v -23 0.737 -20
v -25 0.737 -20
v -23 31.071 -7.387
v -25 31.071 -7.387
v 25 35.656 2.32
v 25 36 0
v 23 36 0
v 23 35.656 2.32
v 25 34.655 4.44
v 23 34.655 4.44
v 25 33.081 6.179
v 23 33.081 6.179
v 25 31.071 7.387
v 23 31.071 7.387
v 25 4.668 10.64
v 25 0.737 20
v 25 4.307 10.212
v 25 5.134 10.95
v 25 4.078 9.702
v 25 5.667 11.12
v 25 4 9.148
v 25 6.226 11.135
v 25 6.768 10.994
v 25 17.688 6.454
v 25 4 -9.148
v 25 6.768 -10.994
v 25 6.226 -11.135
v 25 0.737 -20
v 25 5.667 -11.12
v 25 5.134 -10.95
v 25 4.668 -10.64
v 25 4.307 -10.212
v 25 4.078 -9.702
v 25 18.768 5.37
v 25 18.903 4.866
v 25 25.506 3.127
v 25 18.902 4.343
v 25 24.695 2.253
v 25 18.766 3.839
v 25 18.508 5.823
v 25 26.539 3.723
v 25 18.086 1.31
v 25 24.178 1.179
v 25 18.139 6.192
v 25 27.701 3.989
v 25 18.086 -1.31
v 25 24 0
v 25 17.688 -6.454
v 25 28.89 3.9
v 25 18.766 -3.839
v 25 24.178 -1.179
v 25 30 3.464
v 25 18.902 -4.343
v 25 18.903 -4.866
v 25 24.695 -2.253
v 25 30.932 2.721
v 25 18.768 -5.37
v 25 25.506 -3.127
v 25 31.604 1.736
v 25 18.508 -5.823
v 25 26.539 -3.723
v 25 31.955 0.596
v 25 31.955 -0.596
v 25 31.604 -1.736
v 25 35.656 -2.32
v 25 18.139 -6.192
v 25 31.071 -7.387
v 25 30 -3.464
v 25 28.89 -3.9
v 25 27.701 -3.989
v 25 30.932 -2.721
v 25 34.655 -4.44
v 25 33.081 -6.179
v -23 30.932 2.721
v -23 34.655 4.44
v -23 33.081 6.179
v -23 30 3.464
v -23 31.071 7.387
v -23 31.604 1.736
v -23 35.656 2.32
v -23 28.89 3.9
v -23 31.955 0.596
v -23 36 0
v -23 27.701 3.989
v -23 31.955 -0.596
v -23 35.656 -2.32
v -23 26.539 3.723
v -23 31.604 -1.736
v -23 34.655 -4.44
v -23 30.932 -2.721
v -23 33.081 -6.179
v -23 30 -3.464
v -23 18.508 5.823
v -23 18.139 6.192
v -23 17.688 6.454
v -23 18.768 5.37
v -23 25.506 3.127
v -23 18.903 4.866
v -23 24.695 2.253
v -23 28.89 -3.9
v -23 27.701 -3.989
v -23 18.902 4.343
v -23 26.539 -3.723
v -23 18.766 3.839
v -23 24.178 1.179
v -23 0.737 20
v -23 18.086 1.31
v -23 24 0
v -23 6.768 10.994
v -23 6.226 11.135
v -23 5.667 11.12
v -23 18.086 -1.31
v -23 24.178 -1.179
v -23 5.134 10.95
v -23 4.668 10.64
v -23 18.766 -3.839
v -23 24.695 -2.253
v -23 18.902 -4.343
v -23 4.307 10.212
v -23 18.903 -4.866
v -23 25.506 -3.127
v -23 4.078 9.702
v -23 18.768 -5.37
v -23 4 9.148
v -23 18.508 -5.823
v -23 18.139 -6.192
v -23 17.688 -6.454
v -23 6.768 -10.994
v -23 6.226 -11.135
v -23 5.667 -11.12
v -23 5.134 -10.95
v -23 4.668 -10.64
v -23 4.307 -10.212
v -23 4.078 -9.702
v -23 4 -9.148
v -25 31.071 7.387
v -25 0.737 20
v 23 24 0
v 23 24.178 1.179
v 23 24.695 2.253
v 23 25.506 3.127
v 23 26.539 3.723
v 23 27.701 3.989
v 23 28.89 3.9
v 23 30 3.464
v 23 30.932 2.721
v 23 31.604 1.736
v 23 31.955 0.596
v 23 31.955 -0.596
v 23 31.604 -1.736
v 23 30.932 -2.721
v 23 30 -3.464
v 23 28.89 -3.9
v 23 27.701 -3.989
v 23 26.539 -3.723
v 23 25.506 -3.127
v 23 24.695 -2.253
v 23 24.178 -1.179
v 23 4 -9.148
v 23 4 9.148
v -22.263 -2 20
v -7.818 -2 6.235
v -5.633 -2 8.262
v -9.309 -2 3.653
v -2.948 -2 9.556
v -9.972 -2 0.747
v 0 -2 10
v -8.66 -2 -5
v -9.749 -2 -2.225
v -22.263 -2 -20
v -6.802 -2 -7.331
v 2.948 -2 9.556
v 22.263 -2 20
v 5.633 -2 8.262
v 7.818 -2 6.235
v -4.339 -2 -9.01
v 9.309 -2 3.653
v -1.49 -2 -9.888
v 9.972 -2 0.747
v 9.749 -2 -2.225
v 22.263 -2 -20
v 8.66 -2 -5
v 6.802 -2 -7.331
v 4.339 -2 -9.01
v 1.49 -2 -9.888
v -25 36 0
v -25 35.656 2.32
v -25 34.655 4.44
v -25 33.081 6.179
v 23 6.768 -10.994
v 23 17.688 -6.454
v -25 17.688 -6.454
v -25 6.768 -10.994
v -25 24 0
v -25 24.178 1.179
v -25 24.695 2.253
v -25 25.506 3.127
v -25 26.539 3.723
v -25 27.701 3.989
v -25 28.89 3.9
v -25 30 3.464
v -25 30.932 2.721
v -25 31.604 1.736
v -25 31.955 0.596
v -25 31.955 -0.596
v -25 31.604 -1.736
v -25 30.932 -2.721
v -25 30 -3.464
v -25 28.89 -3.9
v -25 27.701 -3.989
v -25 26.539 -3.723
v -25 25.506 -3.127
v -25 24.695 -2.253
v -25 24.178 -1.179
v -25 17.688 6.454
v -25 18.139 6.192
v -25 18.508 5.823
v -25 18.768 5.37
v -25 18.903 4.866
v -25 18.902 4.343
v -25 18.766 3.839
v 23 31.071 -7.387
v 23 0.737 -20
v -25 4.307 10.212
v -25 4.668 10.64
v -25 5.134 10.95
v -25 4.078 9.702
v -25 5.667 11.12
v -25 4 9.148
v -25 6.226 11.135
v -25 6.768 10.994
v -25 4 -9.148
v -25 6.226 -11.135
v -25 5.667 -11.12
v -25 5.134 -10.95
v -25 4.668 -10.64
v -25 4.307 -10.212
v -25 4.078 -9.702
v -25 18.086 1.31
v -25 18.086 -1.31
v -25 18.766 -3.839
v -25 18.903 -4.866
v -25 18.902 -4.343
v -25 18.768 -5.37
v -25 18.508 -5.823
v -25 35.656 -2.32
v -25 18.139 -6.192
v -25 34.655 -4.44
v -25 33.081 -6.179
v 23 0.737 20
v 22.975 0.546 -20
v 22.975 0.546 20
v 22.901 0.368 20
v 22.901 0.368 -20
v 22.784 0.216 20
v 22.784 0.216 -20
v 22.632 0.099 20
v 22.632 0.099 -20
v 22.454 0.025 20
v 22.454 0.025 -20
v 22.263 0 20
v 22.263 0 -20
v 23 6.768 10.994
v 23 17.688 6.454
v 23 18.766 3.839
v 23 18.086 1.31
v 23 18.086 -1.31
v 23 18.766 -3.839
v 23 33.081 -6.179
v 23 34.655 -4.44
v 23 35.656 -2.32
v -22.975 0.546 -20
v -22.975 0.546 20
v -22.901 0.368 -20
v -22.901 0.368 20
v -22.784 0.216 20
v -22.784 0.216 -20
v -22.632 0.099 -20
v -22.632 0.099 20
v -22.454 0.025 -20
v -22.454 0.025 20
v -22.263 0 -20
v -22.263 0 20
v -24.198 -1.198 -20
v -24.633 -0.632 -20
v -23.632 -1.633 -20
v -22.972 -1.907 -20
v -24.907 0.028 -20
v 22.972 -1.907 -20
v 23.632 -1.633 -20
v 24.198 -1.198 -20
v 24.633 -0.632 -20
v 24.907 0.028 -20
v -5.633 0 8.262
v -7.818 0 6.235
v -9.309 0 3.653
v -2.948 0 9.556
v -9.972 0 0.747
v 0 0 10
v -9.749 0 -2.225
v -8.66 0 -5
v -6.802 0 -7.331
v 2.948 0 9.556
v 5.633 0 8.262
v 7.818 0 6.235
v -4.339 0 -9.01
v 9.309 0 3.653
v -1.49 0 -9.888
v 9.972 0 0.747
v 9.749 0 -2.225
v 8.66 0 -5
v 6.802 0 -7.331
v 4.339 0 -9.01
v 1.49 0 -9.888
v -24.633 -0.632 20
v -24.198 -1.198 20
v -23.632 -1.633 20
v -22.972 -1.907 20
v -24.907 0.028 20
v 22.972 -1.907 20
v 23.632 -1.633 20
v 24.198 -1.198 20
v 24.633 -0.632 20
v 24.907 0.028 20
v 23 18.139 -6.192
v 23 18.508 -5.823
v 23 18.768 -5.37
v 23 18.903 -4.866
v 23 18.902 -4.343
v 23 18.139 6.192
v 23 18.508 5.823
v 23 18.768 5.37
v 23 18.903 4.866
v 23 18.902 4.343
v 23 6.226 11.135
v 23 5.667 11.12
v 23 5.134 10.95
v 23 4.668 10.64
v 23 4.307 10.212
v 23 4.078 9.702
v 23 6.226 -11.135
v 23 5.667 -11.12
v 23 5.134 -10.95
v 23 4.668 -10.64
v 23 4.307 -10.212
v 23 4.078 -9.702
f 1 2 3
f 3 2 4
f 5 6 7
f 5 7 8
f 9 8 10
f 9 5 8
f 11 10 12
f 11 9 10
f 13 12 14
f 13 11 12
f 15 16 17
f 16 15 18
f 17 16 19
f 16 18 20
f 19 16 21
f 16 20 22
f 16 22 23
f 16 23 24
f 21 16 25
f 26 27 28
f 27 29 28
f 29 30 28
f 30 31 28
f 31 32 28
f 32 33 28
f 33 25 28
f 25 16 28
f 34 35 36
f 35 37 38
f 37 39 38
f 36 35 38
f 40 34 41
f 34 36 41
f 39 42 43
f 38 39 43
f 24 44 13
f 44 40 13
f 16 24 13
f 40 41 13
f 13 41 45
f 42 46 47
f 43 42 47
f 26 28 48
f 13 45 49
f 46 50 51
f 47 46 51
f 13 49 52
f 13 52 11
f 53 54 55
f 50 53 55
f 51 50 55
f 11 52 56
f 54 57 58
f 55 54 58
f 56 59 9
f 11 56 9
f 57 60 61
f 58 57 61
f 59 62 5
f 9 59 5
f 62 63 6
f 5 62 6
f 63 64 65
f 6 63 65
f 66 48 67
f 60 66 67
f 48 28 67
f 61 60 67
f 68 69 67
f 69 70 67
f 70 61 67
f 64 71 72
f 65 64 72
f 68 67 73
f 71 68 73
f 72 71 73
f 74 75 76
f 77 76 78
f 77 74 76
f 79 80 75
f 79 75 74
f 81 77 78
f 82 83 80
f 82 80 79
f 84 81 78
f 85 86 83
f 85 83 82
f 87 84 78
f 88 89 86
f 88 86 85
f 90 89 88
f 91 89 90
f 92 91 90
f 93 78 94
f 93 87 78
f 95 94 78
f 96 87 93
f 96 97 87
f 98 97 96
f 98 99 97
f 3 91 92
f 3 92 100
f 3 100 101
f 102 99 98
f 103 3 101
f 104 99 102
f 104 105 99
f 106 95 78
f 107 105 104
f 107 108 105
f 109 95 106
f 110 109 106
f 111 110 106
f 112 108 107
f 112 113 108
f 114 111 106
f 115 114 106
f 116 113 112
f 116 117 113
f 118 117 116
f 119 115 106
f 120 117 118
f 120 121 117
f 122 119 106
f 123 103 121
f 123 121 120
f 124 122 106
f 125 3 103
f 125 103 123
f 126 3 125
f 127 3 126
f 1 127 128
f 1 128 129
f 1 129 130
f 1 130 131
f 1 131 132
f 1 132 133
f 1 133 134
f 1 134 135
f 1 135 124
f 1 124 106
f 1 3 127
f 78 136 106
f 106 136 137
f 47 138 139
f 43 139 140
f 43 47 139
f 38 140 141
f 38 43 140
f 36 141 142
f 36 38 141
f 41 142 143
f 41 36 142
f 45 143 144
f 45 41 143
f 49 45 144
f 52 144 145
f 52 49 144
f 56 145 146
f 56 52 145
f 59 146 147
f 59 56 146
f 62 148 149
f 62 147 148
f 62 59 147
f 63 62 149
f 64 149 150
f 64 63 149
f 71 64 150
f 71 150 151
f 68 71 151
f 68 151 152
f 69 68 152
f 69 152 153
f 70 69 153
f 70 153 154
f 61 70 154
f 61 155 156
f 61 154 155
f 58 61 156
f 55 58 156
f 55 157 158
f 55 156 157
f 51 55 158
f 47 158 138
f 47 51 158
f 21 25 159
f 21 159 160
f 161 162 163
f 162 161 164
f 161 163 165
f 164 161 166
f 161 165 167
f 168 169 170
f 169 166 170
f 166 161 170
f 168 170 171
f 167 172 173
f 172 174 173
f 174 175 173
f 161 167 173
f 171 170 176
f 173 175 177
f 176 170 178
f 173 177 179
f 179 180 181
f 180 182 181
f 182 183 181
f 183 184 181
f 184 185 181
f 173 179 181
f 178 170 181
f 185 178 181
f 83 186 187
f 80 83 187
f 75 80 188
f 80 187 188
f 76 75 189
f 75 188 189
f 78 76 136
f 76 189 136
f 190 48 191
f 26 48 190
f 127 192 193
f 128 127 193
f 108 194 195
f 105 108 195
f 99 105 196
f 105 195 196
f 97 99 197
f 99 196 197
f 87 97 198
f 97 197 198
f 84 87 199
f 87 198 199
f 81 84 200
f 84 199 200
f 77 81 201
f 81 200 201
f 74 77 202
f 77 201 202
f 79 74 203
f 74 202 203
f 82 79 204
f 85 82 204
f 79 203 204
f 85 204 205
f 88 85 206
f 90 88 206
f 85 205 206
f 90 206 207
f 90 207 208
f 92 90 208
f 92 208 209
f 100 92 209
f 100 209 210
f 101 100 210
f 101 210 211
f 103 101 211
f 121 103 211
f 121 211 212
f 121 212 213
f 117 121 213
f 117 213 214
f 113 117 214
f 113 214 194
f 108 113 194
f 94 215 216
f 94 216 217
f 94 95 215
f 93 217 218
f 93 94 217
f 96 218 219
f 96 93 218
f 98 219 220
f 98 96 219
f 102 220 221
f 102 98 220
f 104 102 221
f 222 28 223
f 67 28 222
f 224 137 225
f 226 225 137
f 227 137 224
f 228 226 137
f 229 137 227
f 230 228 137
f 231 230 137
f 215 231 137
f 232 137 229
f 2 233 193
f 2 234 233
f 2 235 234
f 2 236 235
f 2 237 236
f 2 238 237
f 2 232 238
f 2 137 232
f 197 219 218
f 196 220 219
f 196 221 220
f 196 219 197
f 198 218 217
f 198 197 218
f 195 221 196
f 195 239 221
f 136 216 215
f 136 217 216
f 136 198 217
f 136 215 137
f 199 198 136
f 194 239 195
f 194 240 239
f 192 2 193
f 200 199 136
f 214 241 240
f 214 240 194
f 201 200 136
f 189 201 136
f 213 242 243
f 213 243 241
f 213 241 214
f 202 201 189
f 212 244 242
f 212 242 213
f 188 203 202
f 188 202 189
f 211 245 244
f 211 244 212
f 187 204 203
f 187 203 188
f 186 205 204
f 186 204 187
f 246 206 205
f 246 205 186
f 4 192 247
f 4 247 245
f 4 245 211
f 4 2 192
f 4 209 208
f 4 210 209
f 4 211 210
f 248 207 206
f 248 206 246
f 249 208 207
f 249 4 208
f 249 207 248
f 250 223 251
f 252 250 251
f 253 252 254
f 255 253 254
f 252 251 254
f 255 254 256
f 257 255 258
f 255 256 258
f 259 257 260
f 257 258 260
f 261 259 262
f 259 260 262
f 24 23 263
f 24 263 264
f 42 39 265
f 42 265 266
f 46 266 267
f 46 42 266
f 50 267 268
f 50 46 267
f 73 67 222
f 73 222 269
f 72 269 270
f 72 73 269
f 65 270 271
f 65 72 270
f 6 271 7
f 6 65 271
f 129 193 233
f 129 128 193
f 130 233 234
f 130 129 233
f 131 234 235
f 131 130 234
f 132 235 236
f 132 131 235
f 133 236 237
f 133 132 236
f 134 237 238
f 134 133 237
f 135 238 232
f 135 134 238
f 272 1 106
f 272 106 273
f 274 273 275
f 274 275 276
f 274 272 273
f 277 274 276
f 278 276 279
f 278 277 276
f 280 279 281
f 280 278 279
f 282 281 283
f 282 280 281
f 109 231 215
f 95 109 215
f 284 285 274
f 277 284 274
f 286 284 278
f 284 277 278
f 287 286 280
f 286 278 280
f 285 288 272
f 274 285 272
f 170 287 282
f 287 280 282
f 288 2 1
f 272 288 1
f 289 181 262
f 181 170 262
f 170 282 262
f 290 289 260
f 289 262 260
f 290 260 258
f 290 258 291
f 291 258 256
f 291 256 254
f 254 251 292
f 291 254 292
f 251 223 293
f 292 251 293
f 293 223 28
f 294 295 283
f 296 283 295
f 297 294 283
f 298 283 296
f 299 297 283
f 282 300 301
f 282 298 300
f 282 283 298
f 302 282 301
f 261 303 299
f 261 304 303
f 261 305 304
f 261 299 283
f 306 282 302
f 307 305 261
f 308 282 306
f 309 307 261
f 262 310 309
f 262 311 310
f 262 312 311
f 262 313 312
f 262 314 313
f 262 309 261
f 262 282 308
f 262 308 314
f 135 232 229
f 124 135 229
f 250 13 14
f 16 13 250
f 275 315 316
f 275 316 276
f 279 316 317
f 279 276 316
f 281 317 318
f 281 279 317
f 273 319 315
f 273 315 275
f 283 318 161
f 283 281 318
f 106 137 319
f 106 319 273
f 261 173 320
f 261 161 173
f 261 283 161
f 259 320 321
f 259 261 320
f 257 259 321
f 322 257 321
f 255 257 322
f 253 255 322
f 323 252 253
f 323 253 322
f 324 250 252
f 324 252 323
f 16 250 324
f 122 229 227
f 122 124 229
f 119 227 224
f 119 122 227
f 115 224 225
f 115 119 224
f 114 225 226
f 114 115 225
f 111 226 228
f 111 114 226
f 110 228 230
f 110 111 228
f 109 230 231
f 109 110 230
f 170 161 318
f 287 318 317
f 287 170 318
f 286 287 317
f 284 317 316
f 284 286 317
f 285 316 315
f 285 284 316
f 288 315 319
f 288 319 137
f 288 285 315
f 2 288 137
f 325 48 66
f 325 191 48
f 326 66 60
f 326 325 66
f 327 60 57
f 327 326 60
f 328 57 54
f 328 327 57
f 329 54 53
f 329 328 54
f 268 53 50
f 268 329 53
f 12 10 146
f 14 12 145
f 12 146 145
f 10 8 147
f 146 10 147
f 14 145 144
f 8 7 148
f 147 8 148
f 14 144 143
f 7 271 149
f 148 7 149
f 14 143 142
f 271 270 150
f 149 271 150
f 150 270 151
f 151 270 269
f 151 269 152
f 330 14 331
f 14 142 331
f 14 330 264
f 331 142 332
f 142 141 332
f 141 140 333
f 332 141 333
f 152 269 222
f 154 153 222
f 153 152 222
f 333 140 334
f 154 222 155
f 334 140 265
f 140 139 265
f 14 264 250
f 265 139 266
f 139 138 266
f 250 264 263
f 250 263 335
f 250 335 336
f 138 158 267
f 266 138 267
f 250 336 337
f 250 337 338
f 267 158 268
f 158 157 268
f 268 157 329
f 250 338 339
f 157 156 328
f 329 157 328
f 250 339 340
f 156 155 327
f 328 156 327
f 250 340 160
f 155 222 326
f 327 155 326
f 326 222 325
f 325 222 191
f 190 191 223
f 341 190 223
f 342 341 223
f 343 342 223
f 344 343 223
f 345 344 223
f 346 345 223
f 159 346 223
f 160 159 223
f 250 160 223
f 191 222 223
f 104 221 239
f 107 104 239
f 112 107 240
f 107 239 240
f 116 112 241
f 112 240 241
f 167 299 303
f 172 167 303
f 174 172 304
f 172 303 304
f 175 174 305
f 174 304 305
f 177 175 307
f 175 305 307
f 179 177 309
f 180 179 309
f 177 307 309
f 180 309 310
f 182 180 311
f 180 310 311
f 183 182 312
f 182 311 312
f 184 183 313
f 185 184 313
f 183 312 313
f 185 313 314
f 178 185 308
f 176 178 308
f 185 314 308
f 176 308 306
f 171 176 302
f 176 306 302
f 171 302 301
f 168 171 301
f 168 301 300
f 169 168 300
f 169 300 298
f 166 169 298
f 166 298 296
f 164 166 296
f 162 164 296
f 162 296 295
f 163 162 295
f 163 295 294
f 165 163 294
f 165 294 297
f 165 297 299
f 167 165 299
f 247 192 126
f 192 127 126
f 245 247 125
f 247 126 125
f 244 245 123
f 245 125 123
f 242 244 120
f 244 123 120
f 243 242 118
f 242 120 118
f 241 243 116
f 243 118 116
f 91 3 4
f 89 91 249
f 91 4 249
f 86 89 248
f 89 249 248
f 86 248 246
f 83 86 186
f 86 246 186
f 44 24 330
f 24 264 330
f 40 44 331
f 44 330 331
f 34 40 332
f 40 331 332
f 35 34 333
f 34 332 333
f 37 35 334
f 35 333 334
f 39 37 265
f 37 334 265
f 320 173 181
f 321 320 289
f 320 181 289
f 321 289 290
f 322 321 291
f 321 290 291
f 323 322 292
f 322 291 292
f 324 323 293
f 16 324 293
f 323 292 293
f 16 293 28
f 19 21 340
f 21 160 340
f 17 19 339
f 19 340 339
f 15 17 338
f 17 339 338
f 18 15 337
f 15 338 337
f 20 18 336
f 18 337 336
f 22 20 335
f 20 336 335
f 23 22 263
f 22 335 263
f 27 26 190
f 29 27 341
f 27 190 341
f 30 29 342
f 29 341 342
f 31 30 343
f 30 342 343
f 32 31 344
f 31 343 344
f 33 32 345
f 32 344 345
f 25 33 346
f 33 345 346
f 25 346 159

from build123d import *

# Parameters (mm, degrees)
SKETCH1_W                    = 50
SKETCH1_H                    = 40
BASE_FLANGE1_DEPTH           = 2
EDGE_FLANGE1_STRIP_W         = 9.4732
EDGE_FLANGE1_STRIP_H         = 2
EDGE_FLANGE1_STRIP_CUT_DEPTH = 40
EDGE_FLANGE1_DEPTH           = 40
SKETCH14_R                   = 4
CUT_EXTRUDE2_DEPTH           = 10
FILLET1_R                    = 2
FILLET1_OF_MIRROR2_R         = 2
SKETCH23_R                   = 10
CUT_EXTRUDE3_DEPTH           = 10


# Sheet-metal steps are written as plain solids
with BuildPart() as part:
    # Sketch1 → Base-Flange1 (new body)
    with BuildSketch(Plane(origin=(0, 0, 0), x_dir=(1, 0, 0), z_dir=(0, 1, 0))):
        Rectangle(SKETCH1_W, SKETCH1_H)
    extrude(amount=-BASE_FLANGE1_DEPTH)

    # Edge-Flange1 strip (across the edge) → Edge-Flange1 strip cut (cut)
    with BuildSketch(Plane(origin=(-25, 0, -20), x_dir=(1, 0, 0), z_dir=(0, 0, 1))):
        with Locations((-2, -1)):
            Rectangle(EDGE_FLANGE1_STRIP_W, EDGE_FLANGE1_STRIP_H)
    edge_flange1_strip_cut = extrude(amount=EDGE_FLANGE1_STRIP_CUT_DEPTH, mode=Mode.SUBTRACT)

    # Edge-Flange1 section (across the edge) → Edge-Flange1 (add)
    with BuildSketch(Plane(origin=(-25, 0, -20), x_dir=(1, 0, 0), z_dir=(0, 0, 1))):
        with BuildLine():
            Line((0, 0.7366), (0, 36))
            Line((0, 36), (2, 36))
            Line((2, 36), (2, 0.7366))
            ThreePointArc((2, 0.7366), (2.215745145, 0.215745145), (2.7366, 0))
            Line((2.7366, 0), (2.7366, -2))
            ThreePointArc((2.7366, -2), (0.801531583, -1.198468417), (0, 0.7366))
        make_face()
    edge_flange1 = extrude(amount=EDGE_FLANGE1_DEPTH)

    # Sketch14 → Cut-Extrude2 (cut)
    with BuildSketch(Plane.ZY.offset(25)):
        with BuildLine():
            Line((-20, 0.7366), (-7.38689697, 31.071441544))
            ThreePointArc((-7.38689697, 31.071441544), (-4.440071376, 34.654755155), (0, 36))
            Line((0, 36), (-20, 36))
            Line((-20, 36), (-20, 0.7366))
        make_face()
        with BuildLine():
            Line((20, 36), (0, 36))
            ThreePointArc((0, 36), (4.440071376, 34.654755155), (7.38689697, 31.071441544))
            Line((7.38689697, 31.071441544), (20, 0.7366))
            Line((20, 0.7366), (20, 36))
        make_face()
        with BuildLine():
            Line((-5.608456521, 19.720796207), (-12.145099279, 4))
            Line((-12.145099279, 4), (12.145099279, 4))
            Line((12.145099279, 4), (5.608456521, 19.720796207))
            ThreePointArc((5.608456521, 19.720796207), (0, 18), (-5.608456521, 19.720796207))
        make_face()
        with Locations(Location((0, 28, 0), (0, 0, 270))):
            Circle(SKETCH14_R)
    cut_extrude2 = extrude(amount=-CUT_EXTRUDE2_DEPTH, mode=Mode.SUBTRACT)

    # Fillet1
    fillet1_edges = [part.edges().sort_by_distance(p)[0] for p in [
        (-24, 19.720796207, -5.608456521),
        (-24, 19.720796207, 5.608456521),
        (-24, 4, 12.145099279),
        (-24, 4, -12.145099279),
    ]]
    fillet(fillet1_edges, radius=FILLET1_R)

    # Mirror2: Edge-Flange1 strip cut, Edge-Flange1, Cut-Extrude2 across plane
    add(edge_flange1_strip_cut.mirror(Plane(origin=(0, 0, 0), x_dir=(0, 0, 1), z_dir=(1, 0, 0))), mode=Mode.SUBTRACT)
    add(edge_flange1.mirror(Plane(origin=(0, 0, 0), x_dir=(0, 0, 1), z_dir=(1, 0, 0))))
    add(cut_extrude2.mirror(Plane(origin=(0, 0, 0), x_dir=(0, 0, 1), z_dir=(1, 0, 0))), mode=Mode.SUBTRACT)

    # Fillet1 of Mirror2
    fillet1_of_mirror2_edges = [part.edges().sort_by_distance(p)[0] for p in [
        (24, 19.720796207, -5.608456521),
        (24, 19.720796207, 5.608456521),
        (24, 4, 12.145099279),
        (24, 4, -12.145099279),
    ]]
    fillet(fillet1_of_mirror2_edges, radius=FILLET1_OF_MIRROR2_R)

    # Sketch23 → Cut-Extrude3 (cut)
    with BuildSketch(Plane(origin=(0, 0, 0), x_dir=(1, 0, 0), z_dir=(0, 1, 0))):
        with Locations(Location((0, 0, 0), (0, 0, 270))):
            Circle(SKETCH23_R)
    extrude(amount=-CUT_EXTRUDE3_DEPTH, mode=Mode.SUBTRACT)


solid = part.part
